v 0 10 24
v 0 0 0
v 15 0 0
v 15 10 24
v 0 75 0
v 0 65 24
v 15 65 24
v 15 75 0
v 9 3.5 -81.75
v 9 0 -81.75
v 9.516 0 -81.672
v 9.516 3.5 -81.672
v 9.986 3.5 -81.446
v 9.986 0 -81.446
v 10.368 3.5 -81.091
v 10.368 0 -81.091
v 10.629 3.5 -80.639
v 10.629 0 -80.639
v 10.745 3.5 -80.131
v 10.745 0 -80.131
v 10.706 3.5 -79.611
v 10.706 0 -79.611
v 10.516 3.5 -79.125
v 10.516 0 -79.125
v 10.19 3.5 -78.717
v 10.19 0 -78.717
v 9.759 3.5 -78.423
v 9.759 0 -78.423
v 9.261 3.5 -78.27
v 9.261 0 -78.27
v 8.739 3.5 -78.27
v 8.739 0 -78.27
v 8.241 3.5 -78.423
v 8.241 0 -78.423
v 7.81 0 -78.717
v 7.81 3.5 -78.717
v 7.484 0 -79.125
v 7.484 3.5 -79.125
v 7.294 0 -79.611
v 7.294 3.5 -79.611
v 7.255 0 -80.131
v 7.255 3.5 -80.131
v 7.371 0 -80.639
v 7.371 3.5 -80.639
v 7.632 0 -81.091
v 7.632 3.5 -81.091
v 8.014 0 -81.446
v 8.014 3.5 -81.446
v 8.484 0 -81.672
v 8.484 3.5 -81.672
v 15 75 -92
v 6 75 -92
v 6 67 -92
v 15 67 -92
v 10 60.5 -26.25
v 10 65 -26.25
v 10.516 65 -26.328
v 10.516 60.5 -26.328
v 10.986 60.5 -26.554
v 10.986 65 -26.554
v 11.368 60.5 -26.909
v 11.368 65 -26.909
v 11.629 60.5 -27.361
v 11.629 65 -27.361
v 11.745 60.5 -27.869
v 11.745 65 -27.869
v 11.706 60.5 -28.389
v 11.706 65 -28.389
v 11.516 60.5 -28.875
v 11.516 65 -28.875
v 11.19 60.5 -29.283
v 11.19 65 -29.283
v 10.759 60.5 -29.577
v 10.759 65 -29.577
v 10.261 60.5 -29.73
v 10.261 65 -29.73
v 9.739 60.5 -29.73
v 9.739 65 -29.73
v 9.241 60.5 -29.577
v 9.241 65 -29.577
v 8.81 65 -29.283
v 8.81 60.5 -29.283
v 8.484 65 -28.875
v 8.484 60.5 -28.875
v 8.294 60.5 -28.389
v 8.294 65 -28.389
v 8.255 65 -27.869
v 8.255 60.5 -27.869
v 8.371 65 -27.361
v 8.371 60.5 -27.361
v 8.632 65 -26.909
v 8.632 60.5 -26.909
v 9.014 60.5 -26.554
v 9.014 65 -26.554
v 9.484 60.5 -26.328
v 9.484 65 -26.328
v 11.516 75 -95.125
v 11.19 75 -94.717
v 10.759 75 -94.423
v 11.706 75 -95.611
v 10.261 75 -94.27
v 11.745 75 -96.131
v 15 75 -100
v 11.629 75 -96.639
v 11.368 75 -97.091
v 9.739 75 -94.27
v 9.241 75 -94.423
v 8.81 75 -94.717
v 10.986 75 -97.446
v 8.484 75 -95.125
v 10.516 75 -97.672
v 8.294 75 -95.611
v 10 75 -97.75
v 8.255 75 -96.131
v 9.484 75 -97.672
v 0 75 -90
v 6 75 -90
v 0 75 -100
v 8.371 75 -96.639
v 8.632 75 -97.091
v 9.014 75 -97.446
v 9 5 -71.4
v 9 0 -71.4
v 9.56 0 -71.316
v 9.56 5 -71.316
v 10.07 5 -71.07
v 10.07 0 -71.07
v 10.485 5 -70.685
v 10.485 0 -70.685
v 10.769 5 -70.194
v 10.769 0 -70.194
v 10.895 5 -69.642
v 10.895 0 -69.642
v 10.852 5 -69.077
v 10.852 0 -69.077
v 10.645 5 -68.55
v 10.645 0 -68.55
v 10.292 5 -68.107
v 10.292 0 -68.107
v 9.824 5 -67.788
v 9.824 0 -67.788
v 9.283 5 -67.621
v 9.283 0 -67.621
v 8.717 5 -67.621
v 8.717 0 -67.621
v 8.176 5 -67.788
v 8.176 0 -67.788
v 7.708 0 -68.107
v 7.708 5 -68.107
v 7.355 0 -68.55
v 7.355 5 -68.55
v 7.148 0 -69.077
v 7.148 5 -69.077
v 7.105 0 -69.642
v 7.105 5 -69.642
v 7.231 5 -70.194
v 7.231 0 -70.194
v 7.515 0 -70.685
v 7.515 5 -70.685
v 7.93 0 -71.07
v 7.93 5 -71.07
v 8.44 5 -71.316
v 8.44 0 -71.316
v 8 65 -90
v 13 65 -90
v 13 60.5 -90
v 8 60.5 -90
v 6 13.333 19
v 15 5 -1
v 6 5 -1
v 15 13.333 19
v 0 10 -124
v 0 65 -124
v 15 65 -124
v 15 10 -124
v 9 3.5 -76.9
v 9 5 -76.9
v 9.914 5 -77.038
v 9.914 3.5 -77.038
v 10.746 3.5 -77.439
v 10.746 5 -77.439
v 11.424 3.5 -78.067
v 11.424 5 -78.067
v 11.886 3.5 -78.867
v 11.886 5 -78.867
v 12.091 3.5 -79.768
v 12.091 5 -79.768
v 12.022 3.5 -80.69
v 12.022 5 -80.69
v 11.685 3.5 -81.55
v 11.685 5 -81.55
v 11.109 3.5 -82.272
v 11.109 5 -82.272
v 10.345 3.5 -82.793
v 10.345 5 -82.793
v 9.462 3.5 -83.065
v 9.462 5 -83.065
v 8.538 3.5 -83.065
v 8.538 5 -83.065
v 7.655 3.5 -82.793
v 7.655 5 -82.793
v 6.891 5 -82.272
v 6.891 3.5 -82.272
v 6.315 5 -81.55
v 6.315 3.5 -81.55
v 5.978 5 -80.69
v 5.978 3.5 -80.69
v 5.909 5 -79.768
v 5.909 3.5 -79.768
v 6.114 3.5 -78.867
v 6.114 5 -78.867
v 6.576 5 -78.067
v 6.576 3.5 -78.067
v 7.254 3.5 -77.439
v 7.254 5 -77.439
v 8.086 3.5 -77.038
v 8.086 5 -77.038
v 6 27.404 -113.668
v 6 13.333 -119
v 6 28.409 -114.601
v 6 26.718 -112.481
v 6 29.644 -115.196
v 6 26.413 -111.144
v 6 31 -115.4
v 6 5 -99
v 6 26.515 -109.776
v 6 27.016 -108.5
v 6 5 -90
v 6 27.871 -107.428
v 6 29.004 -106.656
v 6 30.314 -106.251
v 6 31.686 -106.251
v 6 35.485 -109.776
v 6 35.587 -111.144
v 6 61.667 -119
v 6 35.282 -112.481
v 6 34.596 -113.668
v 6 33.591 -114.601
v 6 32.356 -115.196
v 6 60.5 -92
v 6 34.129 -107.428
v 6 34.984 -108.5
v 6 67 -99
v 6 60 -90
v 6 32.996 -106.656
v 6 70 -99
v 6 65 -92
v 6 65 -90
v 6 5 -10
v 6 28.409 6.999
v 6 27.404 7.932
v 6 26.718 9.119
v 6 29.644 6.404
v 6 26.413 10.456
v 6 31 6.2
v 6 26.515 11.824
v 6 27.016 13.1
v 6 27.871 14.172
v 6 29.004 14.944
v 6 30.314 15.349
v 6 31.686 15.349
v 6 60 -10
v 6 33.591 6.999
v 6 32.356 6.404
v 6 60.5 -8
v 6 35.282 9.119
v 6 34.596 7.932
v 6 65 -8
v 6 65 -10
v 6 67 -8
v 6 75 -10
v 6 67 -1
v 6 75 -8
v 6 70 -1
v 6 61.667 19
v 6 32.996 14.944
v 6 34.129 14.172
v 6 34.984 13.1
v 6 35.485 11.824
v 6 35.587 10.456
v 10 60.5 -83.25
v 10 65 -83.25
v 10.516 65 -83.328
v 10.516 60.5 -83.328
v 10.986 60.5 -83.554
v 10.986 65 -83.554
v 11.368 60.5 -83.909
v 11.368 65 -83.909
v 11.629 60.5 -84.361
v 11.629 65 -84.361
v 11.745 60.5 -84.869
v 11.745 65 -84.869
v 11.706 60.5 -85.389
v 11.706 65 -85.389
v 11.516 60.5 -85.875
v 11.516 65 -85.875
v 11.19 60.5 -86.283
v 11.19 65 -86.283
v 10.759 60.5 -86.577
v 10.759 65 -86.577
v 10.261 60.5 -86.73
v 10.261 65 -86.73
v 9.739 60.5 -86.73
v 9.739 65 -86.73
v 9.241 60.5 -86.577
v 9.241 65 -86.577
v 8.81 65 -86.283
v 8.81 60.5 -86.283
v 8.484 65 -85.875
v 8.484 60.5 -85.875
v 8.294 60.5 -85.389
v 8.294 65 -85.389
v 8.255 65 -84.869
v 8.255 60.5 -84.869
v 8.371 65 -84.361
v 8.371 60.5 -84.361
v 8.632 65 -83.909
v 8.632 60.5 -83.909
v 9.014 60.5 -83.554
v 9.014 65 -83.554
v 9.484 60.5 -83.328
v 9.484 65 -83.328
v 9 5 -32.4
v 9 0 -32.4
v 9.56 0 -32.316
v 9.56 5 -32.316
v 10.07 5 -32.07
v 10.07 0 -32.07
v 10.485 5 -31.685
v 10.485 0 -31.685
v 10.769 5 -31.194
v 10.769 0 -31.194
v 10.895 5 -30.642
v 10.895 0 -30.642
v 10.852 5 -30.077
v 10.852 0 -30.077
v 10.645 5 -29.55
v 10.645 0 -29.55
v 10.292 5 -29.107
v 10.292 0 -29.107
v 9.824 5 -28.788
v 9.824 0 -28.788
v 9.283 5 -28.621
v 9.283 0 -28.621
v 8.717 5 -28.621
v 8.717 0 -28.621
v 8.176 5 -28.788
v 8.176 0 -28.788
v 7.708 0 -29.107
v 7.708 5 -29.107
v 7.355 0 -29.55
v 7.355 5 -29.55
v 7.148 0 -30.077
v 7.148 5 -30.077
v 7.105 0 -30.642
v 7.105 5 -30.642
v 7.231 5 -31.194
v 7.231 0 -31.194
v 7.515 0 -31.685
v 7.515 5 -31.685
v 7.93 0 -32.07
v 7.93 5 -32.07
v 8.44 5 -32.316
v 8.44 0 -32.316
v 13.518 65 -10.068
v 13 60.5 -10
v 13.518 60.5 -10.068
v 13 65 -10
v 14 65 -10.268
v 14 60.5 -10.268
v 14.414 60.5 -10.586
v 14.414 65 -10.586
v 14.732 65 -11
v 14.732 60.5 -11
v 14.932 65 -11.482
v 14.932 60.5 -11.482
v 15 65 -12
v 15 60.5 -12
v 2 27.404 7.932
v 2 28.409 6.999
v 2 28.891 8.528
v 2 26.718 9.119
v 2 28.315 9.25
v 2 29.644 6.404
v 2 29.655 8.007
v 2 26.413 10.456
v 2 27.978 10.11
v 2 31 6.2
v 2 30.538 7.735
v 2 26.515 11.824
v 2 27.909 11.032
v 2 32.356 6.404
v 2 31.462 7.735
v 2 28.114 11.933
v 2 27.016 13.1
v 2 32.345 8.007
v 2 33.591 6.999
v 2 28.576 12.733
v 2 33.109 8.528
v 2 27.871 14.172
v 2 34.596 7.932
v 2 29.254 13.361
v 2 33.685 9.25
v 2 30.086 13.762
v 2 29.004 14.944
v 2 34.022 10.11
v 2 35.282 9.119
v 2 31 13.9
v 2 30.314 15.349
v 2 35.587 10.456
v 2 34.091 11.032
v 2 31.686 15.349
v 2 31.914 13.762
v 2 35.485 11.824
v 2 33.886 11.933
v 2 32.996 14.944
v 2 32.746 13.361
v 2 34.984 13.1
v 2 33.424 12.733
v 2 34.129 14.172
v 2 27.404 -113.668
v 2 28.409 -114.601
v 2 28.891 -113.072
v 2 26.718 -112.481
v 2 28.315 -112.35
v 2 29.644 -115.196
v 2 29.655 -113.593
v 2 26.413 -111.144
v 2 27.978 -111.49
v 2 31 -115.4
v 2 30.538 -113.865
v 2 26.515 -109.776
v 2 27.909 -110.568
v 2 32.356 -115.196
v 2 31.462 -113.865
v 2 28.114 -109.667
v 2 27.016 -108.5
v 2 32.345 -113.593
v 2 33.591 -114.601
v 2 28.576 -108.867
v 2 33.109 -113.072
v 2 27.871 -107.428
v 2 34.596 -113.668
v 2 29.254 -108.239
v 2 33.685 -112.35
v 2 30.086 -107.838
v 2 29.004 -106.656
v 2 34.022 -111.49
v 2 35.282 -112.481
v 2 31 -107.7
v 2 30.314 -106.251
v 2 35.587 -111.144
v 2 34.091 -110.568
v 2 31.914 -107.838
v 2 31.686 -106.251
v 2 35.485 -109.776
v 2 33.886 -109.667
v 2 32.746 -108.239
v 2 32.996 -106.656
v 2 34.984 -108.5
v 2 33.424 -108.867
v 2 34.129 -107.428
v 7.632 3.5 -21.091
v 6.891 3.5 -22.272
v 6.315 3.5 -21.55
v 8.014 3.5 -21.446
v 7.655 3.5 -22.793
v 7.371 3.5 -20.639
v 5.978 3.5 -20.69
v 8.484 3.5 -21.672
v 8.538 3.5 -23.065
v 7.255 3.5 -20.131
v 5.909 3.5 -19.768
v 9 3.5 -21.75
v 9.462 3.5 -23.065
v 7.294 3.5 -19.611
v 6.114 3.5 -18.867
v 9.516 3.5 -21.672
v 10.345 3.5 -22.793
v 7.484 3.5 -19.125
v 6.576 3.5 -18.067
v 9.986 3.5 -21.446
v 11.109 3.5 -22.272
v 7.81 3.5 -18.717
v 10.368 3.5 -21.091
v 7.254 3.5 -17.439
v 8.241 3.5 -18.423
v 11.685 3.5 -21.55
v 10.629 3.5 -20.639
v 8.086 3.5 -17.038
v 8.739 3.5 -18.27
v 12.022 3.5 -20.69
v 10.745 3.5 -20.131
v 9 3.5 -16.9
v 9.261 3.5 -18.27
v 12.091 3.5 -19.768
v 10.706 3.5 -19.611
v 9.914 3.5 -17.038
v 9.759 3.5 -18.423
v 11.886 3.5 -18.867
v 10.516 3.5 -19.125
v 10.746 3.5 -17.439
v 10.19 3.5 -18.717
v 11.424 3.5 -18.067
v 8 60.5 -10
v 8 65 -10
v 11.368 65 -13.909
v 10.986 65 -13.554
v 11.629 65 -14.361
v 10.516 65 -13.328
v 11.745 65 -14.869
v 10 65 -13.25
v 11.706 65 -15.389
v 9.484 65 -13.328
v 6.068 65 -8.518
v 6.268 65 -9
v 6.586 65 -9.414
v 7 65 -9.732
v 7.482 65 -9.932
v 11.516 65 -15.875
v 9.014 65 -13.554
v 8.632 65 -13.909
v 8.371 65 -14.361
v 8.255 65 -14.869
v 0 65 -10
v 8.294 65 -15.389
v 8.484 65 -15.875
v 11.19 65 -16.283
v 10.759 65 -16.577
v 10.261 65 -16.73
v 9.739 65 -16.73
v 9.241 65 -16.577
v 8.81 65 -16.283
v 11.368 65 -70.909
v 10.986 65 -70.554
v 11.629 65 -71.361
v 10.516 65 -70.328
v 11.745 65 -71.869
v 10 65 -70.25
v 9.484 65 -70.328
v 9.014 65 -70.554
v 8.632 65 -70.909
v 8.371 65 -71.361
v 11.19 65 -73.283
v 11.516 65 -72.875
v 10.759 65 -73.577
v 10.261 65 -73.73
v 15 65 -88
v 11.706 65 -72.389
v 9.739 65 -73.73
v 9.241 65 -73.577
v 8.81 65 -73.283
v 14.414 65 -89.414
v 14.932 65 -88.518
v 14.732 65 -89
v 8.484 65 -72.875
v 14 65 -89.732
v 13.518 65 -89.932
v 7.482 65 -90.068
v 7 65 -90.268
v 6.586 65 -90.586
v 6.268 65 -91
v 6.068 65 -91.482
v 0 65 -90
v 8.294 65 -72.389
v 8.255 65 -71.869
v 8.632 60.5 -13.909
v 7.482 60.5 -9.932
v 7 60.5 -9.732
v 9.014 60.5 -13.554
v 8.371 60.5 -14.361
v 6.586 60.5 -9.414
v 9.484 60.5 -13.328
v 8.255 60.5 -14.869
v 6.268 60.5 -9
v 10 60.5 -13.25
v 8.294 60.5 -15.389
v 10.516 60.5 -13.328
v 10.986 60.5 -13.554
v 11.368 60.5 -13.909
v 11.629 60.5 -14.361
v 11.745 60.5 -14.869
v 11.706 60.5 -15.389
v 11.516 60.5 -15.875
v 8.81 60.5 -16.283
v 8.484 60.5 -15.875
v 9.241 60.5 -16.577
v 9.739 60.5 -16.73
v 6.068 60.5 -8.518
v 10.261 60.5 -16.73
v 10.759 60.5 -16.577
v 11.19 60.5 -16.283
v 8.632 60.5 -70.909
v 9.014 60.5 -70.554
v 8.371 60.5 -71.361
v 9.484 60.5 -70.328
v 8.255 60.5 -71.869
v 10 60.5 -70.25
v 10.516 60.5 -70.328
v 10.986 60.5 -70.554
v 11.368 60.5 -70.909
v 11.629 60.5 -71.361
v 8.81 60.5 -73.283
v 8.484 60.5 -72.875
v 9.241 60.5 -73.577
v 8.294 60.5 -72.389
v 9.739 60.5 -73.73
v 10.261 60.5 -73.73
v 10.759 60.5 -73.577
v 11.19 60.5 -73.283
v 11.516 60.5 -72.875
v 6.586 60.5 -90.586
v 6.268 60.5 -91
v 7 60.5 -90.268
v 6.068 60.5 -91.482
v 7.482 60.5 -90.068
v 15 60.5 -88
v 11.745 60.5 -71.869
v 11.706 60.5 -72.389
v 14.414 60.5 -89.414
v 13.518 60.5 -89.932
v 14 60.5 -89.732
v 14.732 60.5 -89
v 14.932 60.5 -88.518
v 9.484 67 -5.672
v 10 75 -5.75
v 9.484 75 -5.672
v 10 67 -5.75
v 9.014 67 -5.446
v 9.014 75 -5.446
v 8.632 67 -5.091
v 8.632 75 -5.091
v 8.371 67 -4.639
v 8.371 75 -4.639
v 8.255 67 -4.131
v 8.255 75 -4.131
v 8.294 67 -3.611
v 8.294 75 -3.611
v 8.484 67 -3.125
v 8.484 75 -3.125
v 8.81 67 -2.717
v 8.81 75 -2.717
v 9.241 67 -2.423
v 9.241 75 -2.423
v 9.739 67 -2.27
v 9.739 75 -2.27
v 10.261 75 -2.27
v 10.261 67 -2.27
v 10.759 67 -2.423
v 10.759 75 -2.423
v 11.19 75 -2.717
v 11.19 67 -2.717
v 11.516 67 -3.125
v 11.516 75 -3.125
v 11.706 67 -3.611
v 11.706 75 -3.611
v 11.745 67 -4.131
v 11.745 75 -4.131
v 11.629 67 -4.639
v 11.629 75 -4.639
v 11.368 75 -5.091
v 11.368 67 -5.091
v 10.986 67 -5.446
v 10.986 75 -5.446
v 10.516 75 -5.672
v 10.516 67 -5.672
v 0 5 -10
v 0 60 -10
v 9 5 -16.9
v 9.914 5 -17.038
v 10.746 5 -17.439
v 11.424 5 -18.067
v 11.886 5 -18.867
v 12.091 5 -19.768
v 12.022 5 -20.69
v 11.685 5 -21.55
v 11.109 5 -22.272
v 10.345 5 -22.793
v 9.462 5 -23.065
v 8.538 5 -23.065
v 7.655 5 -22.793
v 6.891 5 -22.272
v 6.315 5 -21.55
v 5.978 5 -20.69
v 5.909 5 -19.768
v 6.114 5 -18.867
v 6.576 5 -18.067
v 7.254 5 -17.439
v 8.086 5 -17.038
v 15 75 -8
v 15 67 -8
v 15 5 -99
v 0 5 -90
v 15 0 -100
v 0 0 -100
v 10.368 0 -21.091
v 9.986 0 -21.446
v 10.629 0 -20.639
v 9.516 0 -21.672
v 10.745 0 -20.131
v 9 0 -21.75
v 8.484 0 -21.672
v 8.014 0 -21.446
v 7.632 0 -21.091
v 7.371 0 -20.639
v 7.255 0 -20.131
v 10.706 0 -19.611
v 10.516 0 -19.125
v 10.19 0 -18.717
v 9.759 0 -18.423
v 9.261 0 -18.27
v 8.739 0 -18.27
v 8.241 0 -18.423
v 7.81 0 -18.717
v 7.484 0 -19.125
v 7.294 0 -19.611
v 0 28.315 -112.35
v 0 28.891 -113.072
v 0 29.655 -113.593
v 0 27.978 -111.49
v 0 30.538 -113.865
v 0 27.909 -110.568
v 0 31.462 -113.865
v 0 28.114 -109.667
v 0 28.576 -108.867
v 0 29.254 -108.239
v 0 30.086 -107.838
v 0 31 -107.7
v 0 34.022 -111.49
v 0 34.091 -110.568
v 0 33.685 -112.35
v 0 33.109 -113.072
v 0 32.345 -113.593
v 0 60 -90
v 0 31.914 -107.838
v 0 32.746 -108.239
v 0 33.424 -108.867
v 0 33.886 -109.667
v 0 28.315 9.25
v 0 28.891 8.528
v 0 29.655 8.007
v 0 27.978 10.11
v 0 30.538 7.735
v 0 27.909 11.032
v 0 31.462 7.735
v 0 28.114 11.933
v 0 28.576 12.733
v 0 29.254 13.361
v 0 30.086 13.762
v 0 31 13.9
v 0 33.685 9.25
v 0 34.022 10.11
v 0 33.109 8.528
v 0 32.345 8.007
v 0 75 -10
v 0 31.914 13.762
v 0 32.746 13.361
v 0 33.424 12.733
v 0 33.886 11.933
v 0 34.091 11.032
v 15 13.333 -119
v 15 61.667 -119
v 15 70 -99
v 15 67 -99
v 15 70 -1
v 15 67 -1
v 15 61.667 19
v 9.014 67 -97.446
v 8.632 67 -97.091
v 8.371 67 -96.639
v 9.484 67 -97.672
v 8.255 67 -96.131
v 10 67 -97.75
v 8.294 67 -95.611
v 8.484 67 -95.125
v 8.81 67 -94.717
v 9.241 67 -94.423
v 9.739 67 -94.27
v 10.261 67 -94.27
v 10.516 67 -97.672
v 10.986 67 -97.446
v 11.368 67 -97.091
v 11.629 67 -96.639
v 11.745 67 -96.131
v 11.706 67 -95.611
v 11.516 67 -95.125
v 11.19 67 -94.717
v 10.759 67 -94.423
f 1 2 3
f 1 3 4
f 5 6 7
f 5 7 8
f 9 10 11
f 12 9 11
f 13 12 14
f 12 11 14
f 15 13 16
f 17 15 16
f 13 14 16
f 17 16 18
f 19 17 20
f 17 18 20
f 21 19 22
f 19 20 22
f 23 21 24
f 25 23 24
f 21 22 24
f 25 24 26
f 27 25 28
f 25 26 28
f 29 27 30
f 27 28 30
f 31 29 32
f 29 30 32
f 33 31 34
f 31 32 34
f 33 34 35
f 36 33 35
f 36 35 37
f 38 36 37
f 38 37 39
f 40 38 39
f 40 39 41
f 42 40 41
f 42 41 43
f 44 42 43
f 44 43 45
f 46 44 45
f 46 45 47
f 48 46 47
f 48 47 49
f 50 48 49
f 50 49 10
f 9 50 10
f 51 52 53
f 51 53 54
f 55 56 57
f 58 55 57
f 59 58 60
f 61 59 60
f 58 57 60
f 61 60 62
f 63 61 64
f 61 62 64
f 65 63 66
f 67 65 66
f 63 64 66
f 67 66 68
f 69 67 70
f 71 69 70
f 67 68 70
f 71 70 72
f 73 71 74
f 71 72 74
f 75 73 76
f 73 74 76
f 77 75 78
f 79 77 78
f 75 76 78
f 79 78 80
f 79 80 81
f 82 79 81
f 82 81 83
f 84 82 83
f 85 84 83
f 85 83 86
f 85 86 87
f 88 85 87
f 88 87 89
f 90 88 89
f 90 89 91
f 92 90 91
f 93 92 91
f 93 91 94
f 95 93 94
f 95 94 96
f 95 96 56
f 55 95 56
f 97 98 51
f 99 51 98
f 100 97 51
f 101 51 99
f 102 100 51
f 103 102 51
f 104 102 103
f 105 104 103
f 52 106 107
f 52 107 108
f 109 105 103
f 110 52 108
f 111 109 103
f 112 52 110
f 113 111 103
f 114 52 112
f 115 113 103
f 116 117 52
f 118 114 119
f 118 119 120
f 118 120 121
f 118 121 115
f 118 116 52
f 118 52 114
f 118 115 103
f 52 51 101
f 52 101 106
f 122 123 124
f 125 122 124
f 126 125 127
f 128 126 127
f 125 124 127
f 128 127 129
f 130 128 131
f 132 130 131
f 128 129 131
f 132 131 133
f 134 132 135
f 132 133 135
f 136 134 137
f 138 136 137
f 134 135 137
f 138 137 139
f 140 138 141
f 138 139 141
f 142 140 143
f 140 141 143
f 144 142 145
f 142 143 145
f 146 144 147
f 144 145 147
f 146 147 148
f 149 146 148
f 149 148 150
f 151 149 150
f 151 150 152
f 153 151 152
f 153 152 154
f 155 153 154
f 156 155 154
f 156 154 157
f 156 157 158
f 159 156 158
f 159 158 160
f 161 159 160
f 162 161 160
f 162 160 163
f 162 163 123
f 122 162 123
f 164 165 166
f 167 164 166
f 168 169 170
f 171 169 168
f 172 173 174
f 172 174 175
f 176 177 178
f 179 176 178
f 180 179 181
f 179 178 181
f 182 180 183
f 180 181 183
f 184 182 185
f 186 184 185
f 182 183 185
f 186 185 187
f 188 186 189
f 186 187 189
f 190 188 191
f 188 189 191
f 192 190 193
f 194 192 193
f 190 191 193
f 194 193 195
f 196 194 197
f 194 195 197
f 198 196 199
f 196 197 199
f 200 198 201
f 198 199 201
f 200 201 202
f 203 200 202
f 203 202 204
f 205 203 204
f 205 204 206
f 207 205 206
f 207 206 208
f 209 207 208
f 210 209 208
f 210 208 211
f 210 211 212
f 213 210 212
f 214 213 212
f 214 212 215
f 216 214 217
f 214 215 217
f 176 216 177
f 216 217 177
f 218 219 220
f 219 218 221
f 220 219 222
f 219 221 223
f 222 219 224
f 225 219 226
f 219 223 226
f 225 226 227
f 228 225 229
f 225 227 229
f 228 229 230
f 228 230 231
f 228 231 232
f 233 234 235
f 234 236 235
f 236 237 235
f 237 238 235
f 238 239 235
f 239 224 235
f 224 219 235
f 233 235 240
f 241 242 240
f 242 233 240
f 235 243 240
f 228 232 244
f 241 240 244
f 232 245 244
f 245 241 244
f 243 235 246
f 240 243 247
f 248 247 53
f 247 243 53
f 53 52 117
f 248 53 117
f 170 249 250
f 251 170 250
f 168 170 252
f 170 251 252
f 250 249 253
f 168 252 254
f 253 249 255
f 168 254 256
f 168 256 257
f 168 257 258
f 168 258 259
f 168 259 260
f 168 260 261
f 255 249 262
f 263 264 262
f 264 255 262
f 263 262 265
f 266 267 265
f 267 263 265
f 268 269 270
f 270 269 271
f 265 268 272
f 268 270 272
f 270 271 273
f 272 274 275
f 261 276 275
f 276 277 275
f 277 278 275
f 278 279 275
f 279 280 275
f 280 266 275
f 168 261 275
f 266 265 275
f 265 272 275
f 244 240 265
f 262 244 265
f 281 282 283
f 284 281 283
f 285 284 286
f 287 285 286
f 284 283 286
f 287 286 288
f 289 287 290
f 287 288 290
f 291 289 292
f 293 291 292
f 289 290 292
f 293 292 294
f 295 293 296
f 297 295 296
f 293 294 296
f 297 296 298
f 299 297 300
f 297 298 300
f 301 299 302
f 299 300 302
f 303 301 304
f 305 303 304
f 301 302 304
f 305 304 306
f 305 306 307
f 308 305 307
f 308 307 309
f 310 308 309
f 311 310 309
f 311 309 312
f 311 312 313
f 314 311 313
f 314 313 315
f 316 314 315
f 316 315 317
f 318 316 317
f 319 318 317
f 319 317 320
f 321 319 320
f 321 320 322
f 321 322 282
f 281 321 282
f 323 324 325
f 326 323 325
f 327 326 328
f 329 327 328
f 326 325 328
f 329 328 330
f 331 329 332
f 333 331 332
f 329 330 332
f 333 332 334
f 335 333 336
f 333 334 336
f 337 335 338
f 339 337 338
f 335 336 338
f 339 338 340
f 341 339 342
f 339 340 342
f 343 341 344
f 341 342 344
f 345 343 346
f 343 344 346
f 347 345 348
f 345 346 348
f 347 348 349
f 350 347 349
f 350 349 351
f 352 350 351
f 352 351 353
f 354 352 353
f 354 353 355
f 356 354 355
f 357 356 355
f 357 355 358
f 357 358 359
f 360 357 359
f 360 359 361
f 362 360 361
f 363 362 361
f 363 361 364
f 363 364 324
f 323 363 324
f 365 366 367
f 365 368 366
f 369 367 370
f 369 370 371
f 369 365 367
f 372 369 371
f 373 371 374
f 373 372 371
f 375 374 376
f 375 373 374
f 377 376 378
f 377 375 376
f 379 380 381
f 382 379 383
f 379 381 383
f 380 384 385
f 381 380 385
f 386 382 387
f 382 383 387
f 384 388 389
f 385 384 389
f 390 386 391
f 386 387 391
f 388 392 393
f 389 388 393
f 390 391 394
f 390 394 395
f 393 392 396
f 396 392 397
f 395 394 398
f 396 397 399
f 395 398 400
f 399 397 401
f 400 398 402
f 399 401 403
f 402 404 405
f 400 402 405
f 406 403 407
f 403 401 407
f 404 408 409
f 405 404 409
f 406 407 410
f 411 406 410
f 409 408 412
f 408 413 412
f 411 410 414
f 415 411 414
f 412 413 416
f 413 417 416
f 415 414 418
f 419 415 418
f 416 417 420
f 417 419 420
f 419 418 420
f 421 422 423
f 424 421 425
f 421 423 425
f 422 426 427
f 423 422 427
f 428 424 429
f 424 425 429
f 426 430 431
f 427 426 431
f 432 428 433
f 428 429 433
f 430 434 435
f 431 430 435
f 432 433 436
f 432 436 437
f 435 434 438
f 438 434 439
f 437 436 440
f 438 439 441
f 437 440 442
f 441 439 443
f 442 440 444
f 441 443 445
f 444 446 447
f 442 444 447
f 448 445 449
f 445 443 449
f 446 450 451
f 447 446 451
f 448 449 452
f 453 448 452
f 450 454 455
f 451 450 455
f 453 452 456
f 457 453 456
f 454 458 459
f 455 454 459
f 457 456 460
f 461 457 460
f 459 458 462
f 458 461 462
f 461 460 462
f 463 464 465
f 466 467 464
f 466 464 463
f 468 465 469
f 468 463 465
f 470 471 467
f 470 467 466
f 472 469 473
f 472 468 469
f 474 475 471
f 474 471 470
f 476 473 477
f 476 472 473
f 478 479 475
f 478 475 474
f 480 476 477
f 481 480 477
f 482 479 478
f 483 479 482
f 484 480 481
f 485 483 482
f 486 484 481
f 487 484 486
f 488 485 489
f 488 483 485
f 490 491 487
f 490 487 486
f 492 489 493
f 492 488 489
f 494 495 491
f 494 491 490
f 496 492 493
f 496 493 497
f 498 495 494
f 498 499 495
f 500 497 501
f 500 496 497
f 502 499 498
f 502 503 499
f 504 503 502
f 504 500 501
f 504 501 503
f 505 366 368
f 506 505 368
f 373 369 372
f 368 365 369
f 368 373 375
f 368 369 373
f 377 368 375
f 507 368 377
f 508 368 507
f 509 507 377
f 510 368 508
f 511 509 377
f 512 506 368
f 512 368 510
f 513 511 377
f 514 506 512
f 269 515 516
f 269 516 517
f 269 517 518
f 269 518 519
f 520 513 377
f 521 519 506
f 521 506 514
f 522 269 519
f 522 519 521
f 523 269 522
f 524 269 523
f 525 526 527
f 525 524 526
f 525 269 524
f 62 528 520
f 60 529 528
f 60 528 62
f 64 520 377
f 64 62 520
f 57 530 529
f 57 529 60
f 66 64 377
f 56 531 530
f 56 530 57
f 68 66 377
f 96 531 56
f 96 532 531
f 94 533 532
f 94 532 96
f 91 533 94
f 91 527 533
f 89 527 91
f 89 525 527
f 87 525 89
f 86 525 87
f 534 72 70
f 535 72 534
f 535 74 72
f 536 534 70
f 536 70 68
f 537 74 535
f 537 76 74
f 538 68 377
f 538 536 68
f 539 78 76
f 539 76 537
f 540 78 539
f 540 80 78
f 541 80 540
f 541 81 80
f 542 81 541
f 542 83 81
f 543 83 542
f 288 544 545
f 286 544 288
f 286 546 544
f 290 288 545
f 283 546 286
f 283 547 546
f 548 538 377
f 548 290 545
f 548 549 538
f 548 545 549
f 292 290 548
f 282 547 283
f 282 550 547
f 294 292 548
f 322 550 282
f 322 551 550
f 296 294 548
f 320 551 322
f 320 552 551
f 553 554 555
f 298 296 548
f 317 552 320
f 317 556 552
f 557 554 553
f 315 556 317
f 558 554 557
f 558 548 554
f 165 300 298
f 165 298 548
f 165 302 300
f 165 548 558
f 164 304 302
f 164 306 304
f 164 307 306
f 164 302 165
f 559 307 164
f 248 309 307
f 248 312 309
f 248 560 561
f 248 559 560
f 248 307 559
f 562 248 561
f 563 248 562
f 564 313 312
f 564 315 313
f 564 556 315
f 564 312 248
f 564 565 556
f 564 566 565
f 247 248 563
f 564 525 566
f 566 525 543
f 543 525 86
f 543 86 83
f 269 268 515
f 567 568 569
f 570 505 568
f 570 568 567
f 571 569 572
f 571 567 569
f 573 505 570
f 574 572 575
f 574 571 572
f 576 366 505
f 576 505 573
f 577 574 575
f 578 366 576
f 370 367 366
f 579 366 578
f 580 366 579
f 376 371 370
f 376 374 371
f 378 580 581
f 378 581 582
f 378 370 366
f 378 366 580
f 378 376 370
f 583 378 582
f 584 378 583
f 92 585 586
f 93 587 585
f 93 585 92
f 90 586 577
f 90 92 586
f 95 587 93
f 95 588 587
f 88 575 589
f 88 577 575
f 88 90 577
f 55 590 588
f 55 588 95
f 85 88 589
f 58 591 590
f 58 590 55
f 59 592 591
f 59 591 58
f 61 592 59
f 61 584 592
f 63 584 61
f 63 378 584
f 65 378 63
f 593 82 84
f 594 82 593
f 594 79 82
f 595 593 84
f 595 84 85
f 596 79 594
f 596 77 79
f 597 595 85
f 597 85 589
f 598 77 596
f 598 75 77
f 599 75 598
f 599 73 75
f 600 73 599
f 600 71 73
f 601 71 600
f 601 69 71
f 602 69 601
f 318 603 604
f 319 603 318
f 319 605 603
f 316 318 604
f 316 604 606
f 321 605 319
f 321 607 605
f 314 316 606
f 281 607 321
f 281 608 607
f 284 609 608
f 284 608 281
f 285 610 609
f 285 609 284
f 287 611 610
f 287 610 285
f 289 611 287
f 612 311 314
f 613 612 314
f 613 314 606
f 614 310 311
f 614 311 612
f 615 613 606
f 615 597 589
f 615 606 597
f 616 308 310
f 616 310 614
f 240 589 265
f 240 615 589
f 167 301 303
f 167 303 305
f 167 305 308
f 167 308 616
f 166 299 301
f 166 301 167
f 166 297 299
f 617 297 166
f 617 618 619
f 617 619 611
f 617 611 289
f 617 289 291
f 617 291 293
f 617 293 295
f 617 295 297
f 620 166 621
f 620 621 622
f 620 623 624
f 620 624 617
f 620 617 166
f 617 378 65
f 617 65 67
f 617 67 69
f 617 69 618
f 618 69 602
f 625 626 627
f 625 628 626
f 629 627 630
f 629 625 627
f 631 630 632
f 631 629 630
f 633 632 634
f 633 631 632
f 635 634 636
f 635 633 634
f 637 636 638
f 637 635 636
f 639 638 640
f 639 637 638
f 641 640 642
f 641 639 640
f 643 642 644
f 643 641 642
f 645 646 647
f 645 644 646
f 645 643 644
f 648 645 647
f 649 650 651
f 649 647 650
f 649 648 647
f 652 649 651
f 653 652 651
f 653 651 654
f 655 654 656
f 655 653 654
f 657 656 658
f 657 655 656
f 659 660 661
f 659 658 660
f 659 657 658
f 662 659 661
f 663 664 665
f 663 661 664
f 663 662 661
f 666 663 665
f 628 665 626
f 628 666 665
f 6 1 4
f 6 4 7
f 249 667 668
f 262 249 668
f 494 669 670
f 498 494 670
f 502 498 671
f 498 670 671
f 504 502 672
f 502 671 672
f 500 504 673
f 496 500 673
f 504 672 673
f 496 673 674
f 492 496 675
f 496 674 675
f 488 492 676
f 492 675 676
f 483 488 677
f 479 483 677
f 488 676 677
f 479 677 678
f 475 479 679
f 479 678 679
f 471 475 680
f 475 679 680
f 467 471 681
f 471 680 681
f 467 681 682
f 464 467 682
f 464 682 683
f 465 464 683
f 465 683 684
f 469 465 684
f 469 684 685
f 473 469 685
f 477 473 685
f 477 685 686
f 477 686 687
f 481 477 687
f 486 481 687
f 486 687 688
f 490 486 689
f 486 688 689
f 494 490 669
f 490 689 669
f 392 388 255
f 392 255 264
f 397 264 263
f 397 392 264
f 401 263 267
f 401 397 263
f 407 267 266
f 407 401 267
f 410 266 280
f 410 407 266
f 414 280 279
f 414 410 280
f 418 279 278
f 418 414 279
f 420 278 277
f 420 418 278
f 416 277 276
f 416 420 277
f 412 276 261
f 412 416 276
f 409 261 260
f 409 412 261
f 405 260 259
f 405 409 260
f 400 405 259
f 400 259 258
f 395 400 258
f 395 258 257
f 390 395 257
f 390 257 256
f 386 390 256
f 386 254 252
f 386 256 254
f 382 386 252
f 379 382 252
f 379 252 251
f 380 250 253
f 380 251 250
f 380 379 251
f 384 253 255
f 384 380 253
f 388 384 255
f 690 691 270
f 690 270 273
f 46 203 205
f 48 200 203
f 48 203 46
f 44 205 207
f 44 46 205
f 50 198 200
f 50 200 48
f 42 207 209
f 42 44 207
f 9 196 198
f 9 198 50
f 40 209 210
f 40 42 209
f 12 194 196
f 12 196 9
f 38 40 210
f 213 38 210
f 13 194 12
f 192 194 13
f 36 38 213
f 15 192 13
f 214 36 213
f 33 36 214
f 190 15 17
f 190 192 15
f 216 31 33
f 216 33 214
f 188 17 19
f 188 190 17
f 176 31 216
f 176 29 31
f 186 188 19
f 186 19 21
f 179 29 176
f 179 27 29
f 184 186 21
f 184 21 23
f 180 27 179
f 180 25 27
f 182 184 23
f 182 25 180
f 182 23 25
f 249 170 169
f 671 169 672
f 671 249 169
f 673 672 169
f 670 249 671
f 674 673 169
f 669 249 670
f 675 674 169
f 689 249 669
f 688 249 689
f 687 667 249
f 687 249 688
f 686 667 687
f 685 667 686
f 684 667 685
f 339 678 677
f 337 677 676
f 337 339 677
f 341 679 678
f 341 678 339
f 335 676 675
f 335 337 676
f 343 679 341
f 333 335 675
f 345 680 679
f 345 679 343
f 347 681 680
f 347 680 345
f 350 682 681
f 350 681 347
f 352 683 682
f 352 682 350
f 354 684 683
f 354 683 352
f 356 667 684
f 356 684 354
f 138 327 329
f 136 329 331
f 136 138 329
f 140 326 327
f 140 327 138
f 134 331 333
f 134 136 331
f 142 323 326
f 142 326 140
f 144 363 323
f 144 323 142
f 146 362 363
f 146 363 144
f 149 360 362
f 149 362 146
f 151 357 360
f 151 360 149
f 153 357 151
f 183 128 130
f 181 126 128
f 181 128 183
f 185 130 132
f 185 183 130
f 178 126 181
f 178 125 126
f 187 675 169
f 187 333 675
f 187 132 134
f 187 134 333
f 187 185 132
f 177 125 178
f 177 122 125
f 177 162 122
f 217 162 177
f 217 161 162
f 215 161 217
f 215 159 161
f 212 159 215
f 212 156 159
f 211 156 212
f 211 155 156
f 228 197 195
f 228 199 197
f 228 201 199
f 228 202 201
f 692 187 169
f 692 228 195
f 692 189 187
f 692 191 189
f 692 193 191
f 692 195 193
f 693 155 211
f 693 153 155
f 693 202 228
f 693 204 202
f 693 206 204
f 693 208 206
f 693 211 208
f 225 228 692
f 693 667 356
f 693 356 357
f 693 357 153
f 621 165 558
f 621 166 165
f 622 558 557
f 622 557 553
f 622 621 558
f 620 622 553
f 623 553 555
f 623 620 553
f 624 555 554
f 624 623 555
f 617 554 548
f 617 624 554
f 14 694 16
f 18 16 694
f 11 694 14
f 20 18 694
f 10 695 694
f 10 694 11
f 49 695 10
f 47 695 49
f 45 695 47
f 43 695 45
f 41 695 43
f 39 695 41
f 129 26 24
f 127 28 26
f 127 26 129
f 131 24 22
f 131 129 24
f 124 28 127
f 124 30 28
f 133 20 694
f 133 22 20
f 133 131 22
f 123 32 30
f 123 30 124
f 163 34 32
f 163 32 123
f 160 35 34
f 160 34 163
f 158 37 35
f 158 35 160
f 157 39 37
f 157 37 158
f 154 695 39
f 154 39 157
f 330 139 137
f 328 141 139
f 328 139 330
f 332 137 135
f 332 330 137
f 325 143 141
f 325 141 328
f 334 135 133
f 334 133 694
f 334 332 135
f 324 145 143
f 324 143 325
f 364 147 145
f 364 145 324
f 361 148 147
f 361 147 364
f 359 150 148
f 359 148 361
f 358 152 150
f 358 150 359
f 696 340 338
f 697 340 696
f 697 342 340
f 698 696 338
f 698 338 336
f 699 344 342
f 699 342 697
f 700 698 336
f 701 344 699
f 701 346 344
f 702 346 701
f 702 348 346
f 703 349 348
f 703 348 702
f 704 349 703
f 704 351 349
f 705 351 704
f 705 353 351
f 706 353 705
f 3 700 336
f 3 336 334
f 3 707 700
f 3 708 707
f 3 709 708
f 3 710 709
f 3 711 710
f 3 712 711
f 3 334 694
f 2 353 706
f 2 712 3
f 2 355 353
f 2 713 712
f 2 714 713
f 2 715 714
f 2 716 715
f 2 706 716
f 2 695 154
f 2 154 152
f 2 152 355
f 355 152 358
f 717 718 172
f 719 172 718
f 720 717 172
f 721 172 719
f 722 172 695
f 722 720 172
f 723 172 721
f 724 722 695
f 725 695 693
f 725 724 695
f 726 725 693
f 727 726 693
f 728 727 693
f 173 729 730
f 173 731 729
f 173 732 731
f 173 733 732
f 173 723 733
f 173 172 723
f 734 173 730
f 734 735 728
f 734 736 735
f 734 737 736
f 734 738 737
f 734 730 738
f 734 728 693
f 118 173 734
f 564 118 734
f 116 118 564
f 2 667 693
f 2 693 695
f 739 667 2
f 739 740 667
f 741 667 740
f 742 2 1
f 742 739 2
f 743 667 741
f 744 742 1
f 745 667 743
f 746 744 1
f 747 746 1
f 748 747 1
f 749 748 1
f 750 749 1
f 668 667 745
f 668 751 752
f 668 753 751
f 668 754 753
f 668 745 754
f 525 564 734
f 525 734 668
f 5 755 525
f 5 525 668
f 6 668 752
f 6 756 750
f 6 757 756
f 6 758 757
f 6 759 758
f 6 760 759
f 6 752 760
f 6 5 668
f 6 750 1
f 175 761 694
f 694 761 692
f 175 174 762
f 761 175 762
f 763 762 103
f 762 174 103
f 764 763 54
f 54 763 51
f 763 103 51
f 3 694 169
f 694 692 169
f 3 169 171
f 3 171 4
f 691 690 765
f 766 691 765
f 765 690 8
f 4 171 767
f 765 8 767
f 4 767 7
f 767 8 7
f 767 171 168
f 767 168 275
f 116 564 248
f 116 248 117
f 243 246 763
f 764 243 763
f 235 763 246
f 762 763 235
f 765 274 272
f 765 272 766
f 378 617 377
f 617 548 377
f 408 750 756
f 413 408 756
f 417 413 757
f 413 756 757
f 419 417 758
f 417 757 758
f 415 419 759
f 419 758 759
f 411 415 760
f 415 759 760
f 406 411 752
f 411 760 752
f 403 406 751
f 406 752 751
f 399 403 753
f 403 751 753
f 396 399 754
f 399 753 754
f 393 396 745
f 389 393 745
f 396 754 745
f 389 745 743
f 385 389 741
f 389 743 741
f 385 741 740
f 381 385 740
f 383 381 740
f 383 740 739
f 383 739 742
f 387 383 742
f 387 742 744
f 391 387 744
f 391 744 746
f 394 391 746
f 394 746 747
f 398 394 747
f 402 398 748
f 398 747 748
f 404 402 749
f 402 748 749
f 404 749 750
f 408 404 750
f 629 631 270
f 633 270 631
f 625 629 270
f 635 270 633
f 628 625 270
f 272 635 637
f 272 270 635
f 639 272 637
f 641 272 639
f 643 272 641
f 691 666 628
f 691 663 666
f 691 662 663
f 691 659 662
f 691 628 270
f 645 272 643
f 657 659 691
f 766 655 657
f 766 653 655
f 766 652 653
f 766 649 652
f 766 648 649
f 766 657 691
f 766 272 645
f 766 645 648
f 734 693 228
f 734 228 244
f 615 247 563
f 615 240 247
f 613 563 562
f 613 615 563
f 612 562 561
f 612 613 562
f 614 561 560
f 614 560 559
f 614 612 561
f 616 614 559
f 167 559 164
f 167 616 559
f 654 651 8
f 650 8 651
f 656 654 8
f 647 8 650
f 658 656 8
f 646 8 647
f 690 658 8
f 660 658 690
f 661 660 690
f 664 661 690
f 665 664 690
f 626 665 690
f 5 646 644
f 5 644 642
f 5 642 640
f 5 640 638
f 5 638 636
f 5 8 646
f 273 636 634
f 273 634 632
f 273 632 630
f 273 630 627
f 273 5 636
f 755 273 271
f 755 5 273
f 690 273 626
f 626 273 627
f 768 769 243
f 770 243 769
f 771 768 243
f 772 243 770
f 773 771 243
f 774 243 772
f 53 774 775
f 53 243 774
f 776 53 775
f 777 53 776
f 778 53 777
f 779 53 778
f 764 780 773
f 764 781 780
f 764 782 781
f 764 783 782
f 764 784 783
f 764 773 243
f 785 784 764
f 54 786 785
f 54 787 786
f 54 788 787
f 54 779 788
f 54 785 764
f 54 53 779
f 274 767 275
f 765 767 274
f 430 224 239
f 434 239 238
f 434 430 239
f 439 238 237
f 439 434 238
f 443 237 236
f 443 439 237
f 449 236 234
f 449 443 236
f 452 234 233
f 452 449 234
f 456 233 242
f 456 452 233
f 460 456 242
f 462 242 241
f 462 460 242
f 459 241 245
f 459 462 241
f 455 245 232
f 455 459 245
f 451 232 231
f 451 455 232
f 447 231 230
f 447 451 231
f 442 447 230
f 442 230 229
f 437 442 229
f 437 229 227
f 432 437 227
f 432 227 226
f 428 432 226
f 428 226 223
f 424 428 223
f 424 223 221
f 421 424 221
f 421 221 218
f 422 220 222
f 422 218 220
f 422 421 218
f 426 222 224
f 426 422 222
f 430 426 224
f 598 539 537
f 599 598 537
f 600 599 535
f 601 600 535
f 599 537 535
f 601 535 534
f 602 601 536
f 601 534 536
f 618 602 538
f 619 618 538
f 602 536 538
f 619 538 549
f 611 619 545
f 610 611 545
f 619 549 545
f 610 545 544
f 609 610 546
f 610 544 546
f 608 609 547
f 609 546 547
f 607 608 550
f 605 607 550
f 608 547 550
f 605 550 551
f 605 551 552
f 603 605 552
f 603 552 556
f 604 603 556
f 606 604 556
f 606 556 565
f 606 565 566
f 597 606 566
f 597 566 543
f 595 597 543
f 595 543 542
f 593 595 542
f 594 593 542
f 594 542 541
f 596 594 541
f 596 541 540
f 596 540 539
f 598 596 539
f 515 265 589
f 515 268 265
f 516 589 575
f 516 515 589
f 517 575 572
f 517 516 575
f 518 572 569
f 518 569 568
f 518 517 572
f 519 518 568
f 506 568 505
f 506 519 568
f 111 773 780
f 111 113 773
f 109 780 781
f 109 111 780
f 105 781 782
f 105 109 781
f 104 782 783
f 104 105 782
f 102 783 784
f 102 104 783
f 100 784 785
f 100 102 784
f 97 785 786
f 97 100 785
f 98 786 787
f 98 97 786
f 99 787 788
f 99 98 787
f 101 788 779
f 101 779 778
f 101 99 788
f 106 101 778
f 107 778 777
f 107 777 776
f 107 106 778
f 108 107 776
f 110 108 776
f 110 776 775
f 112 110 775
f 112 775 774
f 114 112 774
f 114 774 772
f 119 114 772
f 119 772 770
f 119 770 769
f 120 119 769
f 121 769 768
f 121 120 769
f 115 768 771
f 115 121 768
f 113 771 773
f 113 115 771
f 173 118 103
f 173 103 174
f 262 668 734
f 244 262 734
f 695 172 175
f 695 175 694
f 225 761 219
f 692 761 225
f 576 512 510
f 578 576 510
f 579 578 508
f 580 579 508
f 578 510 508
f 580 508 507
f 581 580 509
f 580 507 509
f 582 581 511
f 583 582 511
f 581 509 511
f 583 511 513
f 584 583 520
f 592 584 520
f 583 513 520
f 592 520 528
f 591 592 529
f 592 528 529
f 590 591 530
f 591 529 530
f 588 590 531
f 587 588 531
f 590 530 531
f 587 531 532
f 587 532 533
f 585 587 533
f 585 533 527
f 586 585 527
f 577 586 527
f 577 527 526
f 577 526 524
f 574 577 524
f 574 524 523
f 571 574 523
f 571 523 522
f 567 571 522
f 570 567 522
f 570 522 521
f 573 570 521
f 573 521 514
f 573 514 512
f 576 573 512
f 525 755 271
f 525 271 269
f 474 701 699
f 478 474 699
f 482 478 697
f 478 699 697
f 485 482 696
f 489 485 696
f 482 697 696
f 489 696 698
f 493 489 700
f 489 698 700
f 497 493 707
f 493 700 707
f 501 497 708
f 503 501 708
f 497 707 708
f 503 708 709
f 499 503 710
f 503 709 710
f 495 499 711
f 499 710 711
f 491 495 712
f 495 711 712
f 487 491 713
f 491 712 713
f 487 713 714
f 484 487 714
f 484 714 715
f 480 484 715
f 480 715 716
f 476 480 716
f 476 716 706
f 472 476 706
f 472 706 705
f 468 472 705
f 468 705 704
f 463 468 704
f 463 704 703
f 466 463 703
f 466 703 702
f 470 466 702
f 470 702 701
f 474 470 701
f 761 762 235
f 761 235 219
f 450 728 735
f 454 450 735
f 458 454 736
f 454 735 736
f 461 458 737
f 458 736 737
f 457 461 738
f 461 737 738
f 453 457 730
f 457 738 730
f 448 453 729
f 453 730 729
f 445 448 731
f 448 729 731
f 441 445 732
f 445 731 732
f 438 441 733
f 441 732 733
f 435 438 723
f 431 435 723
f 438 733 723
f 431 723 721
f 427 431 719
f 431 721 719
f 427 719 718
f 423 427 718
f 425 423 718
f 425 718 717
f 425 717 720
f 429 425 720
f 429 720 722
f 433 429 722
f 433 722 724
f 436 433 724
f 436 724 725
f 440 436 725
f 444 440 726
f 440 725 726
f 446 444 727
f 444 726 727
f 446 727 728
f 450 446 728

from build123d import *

# Parameters (mm, degrees)
SKETCH13_R              = 4.6
SKETCH13_W              = 80
SKETCH13_H              = 55
BOSS_EXTRUDE4_DEPTH     = 15
CUT_EXTRUDE1_DEPTH      = 9
CUT_EXTRUDE2_DEPTH      = 146.691454794
CUT_EXTRUDE2_DEPTH_BACK = 6
SKETCH16_R              = 1.75
FILLET1_R               = 2
SKETCH17_R              = 1.75
CUT_EXTRUDE3_DEPTH      = 10
SKETCH18_R              = 1.75
SKETCH18_R_2            = 1.9
CUT_EXTRUDE4_DEPTH      = 10
SKETCH21_R              = 4.6
SKETCH21_R_2            = 3.1
BOSS_EXTRUDE7_DEPTH     = 2
SKETCH22_R              = 3.1
CUT_EXTRUDE5_DEPTH      = 1.5
SKETCH23_W              = 9
SKETCH23_H              = 7
SKETCH23_R              = 1.75
BOSS_EXTRUDE8_DEPTH     = 3


with BuildPart() as part:
    # Sketch13 → Boss-Extrude4 (new body)
    with BuildSketch(Plane(origin=(0, 0, 0), x_dir=(0, 0, -1), z_dir=(1, 0, 0))):
        Polygon((0, 0), (-24, 10), (-24, 65), (0, 75), (10, 75), (10, 65), (90, 65), (90, 75), (100, 75), (124, 65), (124, 10), (100, 0), align=None)
        with Locations((-10.8, 31)):
            Circle(SKETCH13_R, mode=Mode.SUBTRACT)
        with Locations((110.8, 31)):
            Circle(SKETCH13_R, mode=Mode.SUBTRACT)
        with Locations((50, 32.5)):
            Rectangle(SKETCH13_W, SKETCH13_H, mode=Mode.SUBTRACT)
    extrude(amount=BOSS_EXTRUDE4_DEPTH)

    # Sketch14 → Cut-Extrude1 (cut)
    with BuildSketch(Plane(origin=(15, 0, 0), x_dir=(0, 0, -1), z_dir=(1, 0, 0))):
        Polygon((10, 70.5), (10, 60.5), (90, 60.5), (90, 70.5), (90, 75), (92, 75), (92, 70), (99, 70), (119, 61.666666667), (119, 13.333333333), (99, 5), (1, 5), (-19, 13.333333333), (-19, 61.666666667), (1, 70), (8, 70), (8, 75), (10, 75), align=None)
    extrude(amount=-CUT_EXTRUDE1_DEPTH, mode=Mode.SUBTRACT)

    # Sketch16 → Cut-Extrude2 (cut, two sides: drawn at the far end of the back side and taken through both)
    with BuildSketch(Plane(origin=(0, 75, 0), x_dir=(1, 0, 0), z_dir=(0, 1, 0)).offset(-CUT_EXTRUDE2_DEPTH_BACK)):
        with Locations(Location((10, 4, 0), (0, 0, 90))):
            Circle(SKETCH16_R)
        with Locations(Location((10, 96, 0), (0, 0, 90))):
            Circle(SKETCH16_R)
    extrude(amount=CUT_EXTRUDE2_DEPTH + CUT_EXTRUDE2_DEPTH_BACK, mode=Mode.SUBTRACT)

    # Fillet1
    fillet1_edges = [part.edges().sort_by_distance(p)[0] for p in [
        (6, 62.75, -90),
        (6, 62.75, -10),
        (15, 62.75, -90),
        (15, 62.75, -10),
    ]]
    fillet(fillet1_edges, radius=FILLET1_R)

    # Sketch17 → Cut-Extrude3 (cut)
    with BuildSketch(Plane(origin=(0, 65, 0), x_dir=(1, 0, 0), z_dir=(0, 1, 0))):
        with Locations(Location((10, 15, 0), (0, 0, 270))):
            Circle(SKETCH17_R)
        with Locations(Location((10, 85, 0), (0, 0, 270))):
            Circle(SKETCH17_R)
        with Locations(Location((10, 72, 0), (0, 0, 270))):
            Circle(SKETCH17_R)
        with Locations(Location((10, 28, 0), (0, 0, 270))):
            Circle(SKETCH17_R)
    extrude(amount=-CUT_EXTRUDE3_DEPTH, mode=Mode.SUBTRACT)

    # Sketch18 → Cut-Extrude4 (cut)
    with BuildSketch(Plane.XZ):
        with Locations(Location((9, -20, 0), (0, 0, 270))):
            Circle(SKETCH18_R)
        with Locations(Location((9, -80, 0), (0, 0, 270))):
            Circle(SKETCH18_R)
        with Locations(Location((9, -30.5, 0), (0, 0, 270))):
            Circle(SKETCH18_R_2)
        with Locations(Location((9, -69.5, 0), (0, 0, 270))):
            Circle(SKETCH18_R_2)
    extrude(amount=-CUT_EXTRUDE4_DEPTH, mode=Mode.SUBTRACT)

    # Sketch21 → Boss-Extrude7 (add)
    # profile 1 of 2: a face of its own
    with BuildSketch(Plane.ZY):
        with Locations((-110.8, 31)):
            Circle(SKETCH21_R)
        with Locations((-110.8, 31)):
            Circle(SKETCH21_R_2, mode=Mode.SUBTRACT)
    # profile 2 of 2: a face of its own
    with BuildSketch(Plane.ZY):
        with Locations((10.8, 31)):
            Circle(SKETCH21_R)
        with Locations((10.8, 31)):
            Circle(SKETCH21_R_2, mode=Mode.SUBTRACT)
    extrude(amount=-BOSS_EXTRUDE7_DEPTH)

    # Sketch22 → Cut-Extrude5 (cut)
    with BuildSketch(Plane(origin=(0, 5, 0), x_dir=(1, 0, 0), z_dir=(0, 1, 0))):
        with Locations(Location((9, 20, 0), (0, 0, 270))):
            Circle(SKETCH22_R)
        with Locations(Location((9, 80, 0), (0, 0, 270))):
            Circle(SKETCH22_R)
    extrude(amount=-CUT_EXTRUDE5_DEPTH, mode=Mode.SUBTRACT)

    # Sketch23 → Boss-Extrude8 (add)
    # profile 1 of 2: a face of its own
    with BuildSketch(Plane.XZ.offset(-70)):
        with Locations((10.5, -95.5)):
            Rectangle(SKETCH23_W, SKETCH23_H)
        with Locations(Location((10, -96, 0), (0, 0, 270))):
            Circle(SKETCH23_R, mode=Mode.SUBTRACT)
    # profile 2 of 2: a face of its own
    with BuildSketch(Plane.XZ.offset(-70)):
        with Locations((10.5, -4.5)):
            Rectangle(SKETCH23_W, SKETCH23_H)
        with Locations(Location((10, -4, 0), (0, 0, 270))):
            Circle(SKETCH23_R, mode=Mode.SUBTRACT)
    extrude(amount=BOSS_EXTRUDE8_DEPTH)


solid = part.part
